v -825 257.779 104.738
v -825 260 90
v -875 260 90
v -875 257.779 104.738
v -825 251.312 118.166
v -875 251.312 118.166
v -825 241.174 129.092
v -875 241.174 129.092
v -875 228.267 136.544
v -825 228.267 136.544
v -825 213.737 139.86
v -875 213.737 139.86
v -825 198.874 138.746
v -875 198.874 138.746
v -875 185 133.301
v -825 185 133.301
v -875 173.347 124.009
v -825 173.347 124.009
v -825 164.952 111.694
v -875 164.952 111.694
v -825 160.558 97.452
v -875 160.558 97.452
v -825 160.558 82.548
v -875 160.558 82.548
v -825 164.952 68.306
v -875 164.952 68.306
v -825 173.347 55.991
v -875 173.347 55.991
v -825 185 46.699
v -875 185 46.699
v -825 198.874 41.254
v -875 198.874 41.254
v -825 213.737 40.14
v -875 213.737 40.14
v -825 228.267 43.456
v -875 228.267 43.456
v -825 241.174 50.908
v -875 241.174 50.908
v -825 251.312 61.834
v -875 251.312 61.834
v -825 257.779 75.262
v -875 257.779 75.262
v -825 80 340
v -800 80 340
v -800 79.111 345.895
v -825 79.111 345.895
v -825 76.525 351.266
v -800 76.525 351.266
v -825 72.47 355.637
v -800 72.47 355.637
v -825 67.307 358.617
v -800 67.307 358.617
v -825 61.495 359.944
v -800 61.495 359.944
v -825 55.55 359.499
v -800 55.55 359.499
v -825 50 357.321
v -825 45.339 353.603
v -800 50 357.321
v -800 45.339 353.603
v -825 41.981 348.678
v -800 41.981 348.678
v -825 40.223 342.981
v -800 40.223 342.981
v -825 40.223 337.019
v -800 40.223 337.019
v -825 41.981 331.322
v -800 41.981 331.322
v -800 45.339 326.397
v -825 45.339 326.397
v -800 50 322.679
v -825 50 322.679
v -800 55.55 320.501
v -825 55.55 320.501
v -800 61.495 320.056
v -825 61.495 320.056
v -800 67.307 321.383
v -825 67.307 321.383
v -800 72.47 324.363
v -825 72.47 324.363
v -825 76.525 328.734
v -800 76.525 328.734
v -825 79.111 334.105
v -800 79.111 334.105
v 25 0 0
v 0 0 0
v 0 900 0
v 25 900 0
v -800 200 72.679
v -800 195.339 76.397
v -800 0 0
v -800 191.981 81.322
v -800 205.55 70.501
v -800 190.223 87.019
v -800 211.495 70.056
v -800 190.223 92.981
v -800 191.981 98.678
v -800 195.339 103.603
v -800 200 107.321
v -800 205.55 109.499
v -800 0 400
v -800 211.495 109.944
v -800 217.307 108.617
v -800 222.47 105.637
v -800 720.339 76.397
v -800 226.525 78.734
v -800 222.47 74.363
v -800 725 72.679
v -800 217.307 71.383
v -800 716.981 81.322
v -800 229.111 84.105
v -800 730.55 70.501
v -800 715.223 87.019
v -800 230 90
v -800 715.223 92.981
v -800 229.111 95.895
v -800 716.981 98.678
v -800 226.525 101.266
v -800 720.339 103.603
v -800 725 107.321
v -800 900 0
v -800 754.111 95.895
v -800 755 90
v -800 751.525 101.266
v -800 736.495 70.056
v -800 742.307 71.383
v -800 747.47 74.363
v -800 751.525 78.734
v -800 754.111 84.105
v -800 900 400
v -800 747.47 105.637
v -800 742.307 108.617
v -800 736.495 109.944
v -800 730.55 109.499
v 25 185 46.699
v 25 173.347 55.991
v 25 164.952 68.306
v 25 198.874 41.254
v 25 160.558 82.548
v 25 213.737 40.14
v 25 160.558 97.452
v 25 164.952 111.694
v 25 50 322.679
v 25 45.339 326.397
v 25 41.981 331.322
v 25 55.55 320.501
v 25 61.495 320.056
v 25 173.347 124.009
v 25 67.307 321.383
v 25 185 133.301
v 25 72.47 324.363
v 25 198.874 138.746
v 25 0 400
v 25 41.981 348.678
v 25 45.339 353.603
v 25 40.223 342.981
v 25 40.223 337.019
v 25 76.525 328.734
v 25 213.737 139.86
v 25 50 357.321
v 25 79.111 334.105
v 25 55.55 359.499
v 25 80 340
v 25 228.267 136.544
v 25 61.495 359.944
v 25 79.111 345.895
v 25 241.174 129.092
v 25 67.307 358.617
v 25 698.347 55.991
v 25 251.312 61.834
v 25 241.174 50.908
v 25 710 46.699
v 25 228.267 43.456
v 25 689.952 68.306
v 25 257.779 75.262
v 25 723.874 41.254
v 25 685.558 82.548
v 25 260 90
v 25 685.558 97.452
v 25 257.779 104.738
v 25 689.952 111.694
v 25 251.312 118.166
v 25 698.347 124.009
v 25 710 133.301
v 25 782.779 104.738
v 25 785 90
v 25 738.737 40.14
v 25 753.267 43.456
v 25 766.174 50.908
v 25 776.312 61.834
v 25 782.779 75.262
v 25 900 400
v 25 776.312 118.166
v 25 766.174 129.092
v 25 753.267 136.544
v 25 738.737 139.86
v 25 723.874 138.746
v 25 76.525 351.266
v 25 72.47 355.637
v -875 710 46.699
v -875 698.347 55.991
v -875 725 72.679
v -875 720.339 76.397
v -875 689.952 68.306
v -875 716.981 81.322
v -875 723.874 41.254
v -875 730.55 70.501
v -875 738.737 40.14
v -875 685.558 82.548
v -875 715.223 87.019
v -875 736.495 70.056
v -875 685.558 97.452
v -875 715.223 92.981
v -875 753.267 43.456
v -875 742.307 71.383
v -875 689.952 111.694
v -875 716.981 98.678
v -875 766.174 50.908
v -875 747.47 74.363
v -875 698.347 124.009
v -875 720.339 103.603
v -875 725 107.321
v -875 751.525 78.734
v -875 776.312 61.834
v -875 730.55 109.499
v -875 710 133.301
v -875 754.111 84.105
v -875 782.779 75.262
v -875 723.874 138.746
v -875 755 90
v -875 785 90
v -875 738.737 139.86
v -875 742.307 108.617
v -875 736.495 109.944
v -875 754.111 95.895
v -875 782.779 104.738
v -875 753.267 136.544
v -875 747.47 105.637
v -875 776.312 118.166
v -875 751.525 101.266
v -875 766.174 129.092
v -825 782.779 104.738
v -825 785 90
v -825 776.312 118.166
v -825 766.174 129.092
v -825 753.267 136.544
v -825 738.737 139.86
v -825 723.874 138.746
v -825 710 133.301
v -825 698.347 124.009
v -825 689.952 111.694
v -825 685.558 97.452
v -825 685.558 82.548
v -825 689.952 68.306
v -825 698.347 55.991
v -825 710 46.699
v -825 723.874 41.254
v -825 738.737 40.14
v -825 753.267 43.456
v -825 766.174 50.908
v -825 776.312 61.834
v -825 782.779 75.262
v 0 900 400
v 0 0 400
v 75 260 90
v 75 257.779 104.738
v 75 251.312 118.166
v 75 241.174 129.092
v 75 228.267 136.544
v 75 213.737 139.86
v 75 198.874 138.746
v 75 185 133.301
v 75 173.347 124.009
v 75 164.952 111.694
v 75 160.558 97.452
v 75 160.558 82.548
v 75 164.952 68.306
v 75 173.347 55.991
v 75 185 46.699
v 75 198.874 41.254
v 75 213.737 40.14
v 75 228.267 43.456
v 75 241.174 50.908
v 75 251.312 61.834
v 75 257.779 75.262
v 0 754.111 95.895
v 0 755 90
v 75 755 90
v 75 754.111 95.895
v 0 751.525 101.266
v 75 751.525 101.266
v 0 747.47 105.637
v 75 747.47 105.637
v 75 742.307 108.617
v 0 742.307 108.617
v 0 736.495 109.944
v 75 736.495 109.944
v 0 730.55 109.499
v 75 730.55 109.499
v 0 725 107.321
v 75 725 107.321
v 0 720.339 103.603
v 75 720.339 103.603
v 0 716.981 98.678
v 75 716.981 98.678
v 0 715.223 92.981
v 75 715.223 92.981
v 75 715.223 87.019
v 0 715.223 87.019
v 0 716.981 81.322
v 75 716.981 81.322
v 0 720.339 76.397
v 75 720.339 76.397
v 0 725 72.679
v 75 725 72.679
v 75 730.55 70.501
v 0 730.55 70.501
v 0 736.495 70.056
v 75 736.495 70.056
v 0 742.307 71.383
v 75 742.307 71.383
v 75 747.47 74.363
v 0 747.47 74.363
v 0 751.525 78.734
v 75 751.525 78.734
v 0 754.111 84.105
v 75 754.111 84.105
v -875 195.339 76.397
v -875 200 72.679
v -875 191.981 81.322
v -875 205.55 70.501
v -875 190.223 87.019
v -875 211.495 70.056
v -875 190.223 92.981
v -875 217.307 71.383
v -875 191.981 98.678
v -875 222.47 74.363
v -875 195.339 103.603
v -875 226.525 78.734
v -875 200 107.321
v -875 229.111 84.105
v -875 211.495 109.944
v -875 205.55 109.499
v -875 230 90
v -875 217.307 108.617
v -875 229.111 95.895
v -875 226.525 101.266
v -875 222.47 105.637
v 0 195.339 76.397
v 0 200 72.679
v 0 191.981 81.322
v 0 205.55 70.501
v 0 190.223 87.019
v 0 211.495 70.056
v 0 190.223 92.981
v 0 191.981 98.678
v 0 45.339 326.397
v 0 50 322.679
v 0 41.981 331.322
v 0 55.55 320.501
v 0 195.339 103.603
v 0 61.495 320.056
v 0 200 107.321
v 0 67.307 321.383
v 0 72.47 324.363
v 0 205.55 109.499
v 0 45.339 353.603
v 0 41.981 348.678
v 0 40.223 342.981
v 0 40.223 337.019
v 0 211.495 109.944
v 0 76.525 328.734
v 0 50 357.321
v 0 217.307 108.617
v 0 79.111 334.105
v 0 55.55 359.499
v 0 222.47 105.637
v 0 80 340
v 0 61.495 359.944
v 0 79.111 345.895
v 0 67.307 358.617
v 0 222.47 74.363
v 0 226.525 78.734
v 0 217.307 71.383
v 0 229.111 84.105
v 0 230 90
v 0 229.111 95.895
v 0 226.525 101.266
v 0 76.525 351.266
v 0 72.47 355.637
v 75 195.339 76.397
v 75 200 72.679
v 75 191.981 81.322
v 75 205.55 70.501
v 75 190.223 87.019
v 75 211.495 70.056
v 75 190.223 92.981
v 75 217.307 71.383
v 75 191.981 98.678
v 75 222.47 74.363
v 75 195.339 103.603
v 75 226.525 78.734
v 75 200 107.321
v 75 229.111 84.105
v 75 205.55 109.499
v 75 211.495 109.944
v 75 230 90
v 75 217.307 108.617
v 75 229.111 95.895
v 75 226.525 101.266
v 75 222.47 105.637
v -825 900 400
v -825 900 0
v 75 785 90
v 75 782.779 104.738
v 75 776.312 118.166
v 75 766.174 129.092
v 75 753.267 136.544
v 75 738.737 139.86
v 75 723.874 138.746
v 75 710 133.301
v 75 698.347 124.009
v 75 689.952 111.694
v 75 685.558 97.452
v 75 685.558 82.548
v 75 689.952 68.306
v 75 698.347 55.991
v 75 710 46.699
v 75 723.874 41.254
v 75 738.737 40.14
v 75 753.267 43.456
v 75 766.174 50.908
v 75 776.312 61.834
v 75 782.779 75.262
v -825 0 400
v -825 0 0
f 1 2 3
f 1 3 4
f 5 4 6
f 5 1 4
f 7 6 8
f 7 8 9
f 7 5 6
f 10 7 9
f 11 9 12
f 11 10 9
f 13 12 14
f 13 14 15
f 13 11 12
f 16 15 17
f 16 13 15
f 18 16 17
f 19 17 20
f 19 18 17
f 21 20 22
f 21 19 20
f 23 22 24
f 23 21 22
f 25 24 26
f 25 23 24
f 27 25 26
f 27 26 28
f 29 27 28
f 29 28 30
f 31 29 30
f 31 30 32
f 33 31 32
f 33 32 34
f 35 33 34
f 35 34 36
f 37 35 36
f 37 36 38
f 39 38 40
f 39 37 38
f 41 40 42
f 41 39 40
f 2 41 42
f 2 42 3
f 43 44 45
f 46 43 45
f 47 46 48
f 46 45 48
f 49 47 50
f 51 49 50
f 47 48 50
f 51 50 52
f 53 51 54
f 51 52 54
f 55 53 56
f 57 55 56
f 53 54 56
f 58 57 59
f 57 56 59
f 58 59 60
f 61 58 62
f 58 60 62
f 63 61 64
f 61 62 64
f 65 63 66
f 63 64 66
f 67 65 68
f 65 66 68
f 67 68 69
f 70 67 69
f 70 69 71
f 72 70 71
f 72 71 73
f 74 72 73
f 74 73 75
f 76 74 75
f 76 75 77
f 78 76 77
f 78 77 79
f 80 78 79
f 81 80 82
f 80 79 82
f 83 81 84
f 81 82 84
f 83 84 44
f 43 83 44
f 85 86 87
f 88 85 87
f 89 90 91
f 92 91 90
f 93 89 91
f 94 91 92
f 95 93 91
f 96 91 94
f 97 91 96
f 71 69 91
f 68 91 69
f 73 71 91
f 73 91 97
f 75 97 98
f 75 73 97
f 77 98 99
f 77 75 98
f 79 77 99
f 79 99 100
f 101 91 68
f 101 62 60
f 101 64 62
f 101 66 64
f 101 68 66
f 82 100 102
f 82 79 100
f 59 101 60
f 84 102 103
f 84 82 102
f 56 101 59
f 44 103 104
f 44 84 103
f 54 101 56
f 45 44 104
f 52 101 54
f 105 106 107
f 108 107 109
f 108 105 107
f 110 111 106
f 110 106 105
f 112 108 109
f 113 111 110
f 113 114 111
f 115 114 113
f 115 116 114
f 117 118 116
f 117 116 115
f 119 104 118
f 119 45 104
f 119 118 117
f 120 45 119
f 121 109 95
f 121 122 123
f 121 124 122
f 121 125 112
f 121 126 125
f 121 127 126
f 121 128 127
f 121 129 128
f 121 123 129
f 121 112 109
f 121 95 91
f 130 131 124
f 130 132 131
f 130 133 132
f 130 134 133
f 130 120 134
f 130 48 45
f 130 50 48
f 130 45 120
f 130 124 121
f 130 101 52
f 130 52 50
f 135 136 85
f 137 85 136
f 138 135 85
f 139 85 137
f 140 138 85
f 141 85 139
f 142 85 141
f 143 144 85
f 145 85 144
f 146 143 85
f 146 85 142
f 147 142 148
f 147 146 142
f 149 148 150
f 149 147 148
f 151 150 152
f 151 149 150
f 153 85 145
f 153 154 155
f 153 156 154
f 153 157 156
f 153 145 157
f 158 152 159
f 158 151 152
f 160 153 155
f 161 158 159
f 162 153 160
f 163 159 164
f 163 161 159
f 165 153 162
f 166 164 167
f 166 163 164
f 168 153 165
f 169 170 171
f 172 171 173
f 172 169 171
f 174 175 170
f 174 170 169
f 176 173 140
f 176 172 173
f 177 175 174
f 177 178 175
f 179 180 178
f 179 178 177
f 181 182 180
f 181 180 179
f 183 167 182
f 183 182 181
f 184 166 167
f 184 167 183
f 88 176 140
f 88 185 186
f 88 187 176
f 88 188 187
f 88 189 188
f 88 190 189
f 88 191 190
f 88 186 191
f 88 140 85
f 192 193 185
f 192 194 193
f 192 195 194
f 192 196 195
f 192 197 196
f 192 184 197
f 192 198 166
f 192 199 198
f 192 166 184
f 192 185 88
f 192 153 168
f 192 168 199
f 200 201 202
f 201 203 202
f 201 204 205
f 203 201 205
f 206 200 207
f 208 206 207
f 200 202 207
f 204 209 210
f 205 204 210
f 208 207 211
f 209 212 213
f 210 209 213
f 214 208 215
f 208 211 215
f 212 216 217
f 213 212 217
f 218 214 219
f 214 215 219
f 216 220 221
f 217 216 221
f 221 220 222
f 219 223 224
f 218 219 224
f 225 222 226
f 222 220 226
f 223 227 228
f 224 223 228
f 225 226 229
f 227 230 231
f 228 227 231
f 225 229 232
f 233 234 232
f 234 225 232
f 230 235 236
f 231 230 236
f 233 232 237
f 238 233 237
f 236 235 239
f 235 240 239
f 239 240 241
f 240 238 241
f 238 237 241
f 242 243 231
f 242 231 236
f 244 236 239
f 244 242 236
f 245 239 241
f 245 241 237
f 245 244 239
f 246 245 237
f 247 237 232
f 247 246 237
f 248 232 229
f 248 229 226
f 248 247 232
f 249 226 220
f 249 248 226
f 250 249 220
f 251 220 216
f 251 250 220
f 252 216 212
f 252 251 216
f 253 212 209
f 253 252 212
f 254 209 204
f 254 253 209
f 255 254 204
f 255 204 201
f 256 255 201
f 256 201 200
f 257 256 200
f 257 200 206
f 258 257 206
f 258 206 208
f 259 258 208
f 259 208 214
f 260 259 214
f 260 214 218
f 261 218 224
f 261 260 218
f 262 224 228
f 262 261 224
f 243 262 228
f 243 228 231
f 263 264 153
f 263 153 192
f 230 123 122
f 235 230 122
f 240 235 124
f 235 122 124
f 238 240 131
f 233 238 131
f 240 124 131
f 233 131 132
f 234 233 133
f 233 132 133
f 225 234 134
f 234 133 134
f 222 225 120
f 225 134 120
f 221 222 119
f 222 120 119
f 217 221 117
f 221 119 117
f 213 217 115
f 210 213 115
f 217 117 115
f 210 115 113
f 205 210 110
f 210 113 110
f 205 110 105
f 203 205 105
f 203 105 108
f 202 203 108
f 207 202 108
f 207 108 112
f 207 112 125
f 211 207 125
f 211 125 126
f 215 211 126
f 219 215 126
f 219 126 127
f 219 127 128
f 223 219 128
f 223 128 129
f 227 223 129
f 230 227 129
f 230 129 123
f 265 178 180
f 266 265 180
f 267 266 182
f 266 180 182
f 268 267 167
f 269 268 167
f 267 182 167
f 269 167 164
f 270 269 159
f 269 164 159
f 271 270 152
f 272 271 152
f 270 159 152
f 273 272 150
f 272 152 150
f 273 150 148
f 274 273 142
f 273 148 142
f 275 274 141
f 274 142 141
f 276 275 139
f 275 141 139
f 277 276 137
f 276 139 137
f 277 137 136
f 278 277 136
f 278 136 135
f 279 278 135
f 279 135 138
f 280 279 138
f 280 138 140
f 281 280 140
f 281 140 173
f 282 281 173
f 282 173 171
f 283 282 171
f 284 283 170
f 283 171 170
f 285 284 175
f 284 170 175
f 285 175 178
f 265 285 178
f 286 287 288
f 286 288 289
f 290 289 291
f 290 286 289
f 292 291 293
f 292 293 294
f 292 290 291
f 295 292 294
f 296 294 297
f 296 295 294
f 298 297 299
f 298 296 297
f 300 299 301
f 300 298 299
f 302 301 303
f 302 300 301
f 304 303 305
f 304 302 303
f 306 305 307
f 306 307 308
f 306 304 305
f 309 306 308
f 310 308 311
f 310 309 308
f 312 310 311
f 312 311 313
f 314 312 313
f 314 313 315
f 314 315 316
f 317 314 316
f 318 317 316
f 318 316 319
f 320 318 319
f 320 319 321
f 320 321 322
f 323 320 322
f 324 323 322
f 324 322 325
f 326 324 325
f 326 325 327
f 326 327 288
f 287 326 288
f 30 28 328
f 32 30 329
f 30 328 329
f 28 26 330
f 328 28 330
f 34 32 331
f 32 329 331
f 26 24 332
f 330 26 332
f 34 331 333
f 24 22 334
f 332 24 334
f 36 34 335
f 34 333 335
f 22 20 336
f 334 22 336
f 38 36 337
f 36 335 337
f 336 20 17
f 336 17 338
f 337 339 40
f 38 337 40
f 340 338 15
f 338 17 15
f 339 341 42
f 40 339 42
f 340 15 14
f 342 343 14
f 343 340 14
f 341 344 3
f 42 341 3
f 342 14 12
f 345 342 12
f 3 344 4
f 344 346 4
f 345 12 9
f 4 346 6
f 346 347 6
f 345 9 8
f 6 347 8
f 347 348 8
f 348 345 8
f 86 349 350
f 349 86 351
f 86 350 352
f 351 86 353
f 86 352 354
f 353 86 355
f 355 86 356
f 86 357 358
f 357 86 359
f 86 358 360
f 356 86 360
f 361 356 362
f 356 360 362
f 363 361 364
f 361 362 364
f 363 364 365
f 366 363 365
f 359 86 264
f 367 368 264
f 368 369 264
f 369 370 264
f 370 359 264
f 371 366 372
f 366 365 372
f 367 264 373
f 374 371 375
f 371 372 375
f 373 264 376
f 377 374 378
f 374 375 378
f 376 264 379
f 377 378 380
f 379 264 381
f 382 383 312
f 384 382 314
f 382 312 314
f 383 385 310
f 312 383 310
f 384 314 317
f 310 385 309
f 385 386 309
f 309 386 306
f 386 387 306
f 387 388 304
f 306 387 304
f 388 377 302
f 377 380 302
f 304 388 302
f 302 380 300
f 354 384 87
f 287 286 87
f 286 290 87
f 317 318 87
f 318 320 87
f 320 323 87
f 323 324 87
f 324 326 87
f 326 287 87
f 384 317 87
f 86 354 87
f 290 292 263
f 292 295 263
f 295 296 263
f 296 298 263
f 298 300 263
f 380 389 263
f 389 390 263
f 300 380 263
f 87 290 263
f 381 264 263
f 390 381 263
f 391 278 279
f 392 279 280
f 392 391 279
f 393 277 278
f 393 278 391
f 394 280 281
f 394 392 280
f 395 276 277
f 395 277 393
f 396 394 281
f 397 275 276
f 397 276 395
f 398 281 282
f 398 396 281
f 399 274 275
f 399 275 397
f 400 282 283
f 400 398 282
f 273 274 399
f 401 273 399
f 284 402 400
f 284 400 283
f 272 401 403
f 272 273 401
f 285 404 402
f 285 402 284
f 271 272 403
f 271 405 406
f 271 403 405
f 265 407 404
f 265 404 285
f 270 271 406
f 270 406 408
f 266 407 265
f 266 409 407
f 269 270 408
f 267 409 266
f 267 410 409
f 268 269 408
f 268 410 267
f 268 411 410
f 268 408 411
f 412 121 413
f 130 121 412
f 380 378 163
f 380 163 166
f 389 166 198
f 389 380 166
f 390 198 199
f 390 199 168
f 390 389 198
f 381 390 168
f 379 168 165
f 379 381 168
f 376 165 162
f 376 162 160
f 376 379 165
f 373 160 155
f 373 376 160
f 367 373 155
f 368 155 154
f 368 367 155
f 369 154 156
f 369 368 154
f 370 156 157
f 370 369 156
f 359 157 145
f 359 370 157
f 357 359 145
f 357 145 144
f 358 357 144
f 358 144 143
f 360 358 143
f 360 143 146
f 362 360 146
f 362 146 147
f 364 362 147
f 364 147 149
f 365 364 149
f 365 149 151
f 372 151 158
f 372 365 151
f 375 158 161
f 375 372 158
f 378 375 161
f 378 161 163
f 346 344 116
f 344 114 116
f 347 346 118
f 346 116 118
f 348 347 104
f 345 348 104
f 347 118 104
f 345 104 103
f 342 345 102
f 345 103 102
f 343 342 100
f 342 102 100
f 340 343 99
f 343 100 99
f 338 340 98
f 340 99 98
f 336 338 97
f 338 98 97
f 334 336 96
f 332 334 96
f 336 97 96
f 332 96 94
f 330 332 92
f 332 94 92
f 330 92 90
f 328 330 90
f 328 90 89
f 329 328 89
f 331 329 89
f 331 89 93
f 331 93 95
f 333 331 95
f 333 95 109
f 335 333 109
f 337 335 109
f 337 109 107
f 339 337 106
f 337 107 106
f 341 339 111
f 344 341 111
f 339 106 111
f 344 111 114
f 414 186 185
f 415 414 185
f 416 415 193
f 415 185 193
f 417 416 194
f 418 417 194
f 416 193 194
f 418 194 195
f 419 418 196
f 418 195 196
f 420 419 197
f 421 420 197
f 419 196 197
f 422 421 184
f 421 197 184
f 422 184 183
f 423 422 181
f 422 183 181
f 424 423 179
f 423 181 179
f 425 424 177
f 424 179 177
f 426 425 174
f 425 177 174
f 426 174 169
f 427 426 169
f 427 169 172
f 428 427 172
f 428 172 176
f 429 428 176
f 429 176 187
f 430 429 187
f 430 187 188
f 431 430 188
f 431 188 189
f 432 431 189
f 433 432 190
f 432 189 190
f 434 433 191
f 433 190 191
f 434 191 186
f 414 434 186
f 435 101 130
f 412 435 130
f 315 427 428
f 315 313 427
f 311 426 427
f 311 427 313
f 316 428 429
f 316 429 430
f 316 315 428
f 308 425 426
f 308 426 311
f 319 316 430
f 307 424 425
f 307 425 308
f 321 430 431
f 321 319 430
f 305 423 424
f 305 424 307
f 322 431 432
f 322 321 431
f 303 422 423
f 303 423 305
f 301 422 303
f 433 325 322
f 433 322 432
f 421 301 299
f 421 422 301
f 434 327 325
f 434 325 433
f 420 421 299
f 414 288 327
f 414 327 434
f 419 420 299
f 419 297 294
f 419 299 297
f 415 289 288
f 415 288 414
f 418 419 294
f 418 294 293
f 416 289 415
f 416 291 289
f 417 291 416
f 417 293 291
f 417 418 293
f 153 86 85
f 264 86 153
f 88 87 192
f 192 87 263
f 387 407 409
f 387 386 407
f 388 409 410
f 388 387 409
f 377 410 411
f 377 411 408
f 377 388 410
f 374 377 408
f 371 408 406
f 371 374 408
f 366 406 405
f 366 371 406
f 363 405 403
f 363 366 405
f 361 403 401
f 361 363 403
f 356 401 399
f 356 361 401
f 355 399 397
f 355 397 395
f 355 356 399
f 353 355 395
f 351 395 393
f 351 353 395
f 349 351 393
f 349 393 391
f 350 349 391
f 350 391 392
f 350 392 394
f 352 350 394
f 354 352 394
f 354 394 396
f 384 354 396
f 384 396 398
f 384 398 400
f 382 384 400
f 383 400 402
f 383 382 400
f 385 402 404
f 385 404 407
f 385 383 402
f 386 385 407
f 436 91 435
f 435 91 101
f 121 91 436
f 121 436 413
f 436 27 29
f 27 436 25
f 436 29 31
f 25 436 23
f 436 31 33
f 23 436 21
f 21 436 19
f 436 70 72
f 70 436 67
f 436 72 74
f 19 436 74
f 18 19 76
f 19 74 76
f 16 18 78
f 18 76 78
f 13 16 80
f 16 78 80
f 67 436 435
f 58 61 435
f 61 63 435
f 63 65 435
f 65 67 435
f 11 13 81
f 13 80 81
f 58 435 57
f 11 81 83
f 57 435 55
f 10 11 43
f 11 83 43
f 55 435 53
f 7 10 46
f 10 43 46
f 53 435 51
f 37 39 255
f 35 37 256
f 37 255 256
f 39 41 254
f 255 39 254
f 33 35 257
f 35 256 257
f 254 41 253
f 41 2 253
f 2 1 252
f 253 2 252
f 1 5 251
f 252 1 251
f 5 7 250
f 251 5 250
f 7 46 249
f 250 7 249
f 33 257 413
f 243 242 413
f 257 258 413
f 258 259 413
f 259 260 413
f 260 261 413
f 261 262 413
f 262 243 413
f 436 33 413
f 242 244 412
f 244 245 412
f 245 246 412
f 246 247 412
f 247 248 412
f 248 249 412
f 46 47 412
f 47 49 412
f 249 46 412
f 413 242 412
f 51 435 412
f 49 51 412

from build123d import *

# Parameters (mm, degrees)
F0_W     = 900
F0_H     = 400
F0_R     = 20
F1_DEPTH = 25
F2_R     = 50
F2_R_2   = 20
F3_DEPTH = 50


with BuildPart() as f1:
    # F0 (on Right) → F1 (new body)
    with BuildSketch(Plane.YZ):
        with Locations((450, 200)):
            Rectangle(F0_W, F0_H)
        with Locations((210, 90)):
            Circle(F0_R, mode=Mode.SUBTRACT)
        with Locations((735, 90)):
            Circle(F0_R, mode=Mode.SUBTRACT)
        with Locations((60, 340)):
            Circle(F0_R, mode=Mode.SUBTRACT)
    extrude(amount=F1_DEPTH)

    # F2 (on face) → F3 (join)
    with BuildSketch(Plane.YZ.offset(25)):
        with Locations((210, 90)):
            Circle(F2_R)
        with Locations((210, 90)):
            Circle(F2_R_2, mode=Mode.SUBTRACT)
        with Locations((735, 90)):
            Circle(F2_R)
        with Locations((735, 90)):
            Circle(F2_R_2, mode=Mode.SUBTRACT)
    extrude(amount=F3_DEPTH)


with BuildPart() as f5_1:
    # F5: instance of F1
    add(f1.part.mirror(Plane(origin=(-400, 451.217022, 200.282208), x_dir=(0, 1, 0), z_dir=(-1, 0, 0))))


solid = Compound([f1.part, f5_1.part])
